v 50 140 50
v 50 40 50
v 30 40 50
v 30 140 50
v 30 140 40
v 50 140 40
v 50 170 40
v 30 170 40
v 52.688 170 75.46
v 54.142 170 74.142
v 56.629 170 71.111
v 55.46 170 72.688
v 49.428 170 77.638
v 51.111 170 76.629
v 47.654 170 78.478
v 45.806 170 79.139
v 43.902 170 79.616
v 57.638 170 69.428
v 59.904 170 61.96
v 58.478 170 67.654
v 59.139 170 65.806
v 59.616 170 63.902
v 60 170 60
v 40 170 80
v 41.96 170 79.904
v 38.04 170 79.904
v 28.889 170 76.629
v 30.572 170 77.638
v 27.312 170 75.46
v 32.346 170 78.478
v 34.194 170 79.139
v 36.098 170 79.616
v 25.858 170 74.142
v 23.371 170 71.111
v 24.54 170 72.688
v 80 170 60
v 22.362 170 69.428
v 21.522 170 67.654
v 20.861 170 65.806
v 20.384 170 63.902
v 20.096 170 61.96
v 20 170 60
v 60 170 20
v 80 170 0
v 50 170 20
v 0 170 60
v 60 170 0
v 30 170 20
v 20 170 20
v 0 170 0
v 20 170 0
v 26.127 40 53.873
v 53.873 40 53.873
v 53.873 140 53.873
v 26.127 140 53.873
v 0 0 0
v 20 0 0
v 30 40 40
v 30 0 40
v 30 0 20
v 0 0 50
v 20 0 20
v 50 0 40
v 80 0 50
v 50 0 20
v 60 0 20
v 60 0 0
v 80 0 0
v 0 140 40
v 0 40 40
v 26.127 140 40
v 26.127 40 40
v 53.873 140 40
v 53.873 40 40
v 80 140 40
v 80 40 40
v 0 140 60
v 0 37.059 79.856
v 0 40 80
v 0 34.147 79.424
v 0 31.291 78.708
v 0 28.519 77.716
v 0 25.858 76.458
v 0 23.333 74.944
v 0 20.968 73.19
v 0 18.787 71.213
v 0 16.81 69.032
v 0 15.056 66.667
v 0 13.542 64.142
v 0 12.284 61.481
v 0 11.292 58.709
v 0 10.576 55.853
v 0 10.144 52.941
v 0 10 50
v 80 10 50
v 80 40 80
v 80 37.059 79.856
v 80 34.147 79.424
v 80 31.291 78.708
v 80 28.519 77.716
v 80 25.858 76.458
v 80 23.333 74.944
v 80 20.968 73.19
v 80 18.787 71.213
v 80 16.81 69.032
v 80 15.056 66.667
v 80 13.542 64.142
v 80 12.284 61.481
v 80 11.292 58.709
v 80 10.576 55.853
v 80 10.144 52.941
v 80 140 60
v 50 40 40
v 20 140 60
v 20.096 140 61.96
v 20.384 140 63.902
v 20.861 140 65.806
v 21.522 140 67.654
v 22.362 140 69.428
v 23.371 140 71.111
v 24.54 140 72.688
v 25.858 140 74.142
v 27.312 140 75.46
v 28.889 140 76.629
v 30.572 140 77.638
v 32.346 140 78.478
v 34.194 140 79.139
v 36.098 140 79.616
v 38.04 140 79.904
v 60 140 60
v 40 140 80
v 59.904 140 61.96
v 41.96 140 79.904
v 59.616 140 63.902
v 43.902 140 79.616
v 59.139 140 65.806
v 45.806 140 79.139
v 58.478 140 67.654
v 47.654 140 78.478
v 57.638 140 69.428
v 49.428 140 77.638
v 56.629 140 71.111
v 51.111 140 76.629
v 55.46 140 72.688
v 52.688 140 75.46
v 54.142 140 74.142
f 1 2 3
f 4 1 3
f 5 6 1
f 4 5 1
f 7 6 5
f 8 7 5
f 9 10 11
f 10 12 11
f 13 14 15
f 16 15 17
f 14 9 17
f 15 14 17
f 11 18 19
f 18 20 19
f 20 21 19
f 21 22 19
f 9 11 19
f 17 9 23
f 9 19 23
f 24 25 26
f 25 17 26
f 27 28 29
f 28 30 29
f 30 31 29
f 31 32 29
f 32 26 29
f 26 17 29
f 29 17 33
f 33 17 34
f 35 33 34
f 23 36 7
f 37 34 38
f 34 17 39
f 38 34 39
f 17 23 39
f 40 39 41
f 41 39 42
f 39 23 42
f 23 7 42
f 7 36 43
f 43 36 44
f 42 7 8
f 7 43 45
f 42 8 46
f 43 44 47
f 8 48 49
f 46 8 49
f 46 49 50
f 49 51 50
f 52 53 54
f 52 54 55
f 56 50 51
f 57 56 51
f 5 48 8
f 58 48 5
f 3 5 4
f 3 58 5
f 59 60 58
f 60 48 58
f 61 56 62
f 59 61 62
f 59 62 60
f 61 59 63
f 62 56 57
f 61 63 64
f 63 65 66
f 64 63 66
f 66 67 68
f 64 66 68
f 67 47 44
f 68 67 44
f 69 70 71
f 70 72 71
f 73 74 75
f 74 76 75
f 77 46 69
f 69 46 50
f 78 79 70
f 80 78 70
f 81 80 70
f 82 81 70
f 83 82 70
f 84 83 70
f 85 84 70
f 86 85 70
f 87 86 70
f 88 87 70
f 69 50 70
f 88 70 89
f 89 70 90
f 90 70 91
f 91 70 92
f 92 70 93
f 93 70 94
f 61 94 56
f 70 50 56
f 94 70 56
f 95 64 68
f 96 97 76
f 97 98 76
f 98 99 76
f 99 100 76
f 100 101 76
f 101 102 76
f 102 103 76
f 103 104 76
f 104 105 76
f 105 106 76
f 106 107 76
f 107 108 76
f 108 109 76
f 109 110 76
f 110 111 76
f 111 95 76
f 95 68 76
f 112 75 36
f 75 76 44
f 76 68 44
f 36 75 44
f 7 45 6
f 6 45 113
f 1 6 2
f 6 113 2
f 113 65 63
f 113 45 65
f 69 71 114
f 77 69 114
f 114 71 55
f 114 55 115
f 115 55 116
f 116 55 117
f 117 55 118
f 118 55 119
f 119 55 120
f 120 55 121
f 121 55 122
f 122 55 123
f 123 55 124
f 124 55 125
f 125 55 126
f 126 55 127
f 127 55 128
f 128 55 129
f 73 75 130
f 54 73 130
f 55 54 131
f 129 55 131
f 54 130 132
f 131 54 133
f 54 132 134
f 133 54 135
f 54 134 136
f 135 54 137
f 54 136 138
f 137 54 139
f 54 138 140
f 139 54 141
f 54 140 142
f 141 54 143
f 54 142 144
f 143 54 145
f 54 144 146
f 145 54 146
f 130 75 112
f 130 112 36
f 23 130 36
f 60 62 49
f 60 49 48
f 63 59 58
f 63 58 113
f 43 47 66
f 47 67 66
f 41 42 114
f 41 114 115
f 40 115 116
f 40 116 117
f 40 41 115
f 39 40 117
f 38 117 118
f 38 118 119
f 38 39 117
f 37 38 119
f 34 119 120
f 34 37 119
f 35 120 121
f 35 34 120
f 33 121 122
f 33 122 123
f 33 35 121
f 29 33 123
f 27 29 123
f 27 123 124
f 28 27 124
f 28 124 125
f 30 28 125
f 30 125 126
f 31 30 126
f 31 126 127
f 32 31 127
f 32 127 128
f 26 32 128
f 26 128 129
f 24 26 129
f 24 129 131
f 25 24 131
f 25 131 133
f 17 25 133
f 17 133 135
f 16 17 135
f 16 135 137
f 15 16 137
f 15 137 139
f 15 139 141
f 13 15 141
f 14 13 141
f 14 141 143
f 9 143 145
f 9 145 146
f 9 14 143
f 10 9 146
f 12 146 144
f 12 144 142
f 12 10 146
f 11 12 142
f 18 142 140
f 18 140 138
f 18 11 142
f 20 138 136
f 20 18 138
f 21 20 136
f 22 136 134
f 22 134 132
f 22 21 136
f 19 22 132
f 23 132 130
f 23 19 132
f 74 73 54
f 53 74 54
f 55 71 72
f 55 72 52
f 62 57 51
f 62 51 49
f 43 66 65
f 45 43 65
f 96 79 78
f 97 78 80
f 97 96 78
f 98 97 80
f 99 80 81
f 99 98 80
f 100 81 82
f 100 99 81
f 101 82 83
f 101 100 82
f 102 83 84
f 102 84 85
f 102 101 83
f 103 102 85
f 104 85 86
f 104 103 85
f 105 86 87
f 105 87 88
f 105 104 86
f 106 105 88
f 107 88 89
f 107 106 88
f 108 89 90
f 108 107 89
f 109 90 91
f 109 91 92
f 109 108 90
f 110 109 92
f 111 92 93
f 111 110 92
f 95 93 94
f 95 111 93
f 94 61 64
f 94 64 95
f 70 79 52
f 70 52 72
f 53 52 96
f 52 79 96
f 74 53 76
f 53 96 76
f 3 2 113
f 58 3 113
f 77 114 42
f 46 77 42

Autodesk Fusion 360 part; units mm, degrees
sketch "Sketch1" plane through (0, 0, 0) normal (0, 0, 1) x (1, 0, 0)
  line L0 (0, 0) -> (80, 0)
  line L1 (80, 0) -> (80, 170)
  line L2 (80, 170) -> (0, 170)
  line L3 (0, 170) -> (0, 0)
  dimension "d1" = 80
  dimension "d2" = 170
extrude "Extrude1" add sketch "Sketch1" along normal blind 80
sketch "Sketch2" plane through (80, 0, 0) normal (1, 0, 0) x (0, 1, 0)
  line L0 (0, 0) -> (170, 0)
  line L1 (170, 0) -> (170, 80)
  line L2 (170, 80) -> (0, 80)
  line L3 (0, 80) -> (0, 0)
  line L4 (0, 50) -> (10, 50)
  arc A0 (40, 80) -> (10, 50) centre (40, 50) ccw
  line L5 (40, 80) -> (40, 40)
  line L6 (40, 40) -> (140, 40)
  line L7 (140, 40) -> (140, 60)
  line L8 (140, 60) -> (170, 60)
  dimension "d5" = 10
  dimension "d6" = 30
  dimension "d8" = 40
  dimension "d9" = 30
  dimension "d10" = 20
  dimension "d12" = 30
extrude "Extrude2" cut sketch "Sketch2" against normal blind 80 contours L2 L3 L4 A0 | L1 L2 L5 L6 L7 L8
sketch "Sketch3" plane through (0, 170, 0) normal (0, 1, 0) x (-1, 0, 0)
  line L0 (0, 60) -> (-80, 60)
  line L1 (-80, 60) -> (-80, 0)
  line L2 (-80, 0) -> (0, 0)
  line L3 (0, 0) -> (0, 60)
  arc A0 (-20, 60) -> (-60, 60) centre (-40, 60) ccw
  dimension "d15" = 20
extrude "Extrude3" add sketch "Sketch3" against normal blind 30 contours L0 A0
sketch "Sketch4" plane through (0, 0, 0) normal (0, -1, 0) x (1, 0, 0)
  line L0 (80, 50) -> (0, 50)
  line L1 (0, 50) -> (0, 0)
  line L2 (0, 0) -> (80, 0)
  line L3 (80, 0) -> (80, 50)
  line L4 (40, 50) -> (40, -1.5381) construction
  line L5 (20, 0) -> (20, 20)
  line L6 (20, 20) -> (30, 20)
  line L7 (30, 20) -> (30, 40)
  line L8 (30, 40) -> (40, 40)
  line L9 (60, 0) -> (60, 20)
  line L10 (50, 40) -> (40, 40)
  line L11 (60, 20) -> (50, 20)
  line L12 (50, 20) -> (50, 40)
  dimension "d18" = 20
  dimension "d19" = 10
  dimension "d20" = 20
  dimension "d21" = 10
extrude "Extrude4" cut sketch "Sketch4" against normal blind 170 contours L2 L5 L6 L7 L8 L9 L10 L11 L12
sketch "Sketch5" plane through (0, 40, 0) normal (0, 1, 0) x (-1, 0, 0)
  line L0 (-80, 80) -> (-80, 40)
  line L1 (-80, 40) -> (-50, 40)
  line L2 (-50, 40) -> (-30, 40)
  line L3 (-30, 40) -> (0, 40)
  line L4 (0, 40) -> (0, 80)
  line L5 (0, 80) -> (-80, 80)
  line L6 (-50, 40) -> (-50, 50)
  line L7 (-50, 50) -> (-30, 50)
  line L8 (-30, 40) -> (-30, 42.318)
  line L9 (-30, 42.318) -> (-30, 50)
  line L10 (-53.8731, 40) -> (-53.8731, 53.8731)
  line L11 (-53.8731, 53.8731) -> (-26.1269, 53.8731)
  line L12 (-26.1269, 42.318) -> (-26.1269, 53.8731)
  line L13 (-26.1269, 40) -> (-26.1269, 42.318)
  dimension "d24" = 10
  dimension "d25" = -3.8731
extrude "Extrude5" add sketch "Sketch5" along normal blind 100 contours L1 L3 L6 L7 L8 L9 L10 L11 L12 L13
